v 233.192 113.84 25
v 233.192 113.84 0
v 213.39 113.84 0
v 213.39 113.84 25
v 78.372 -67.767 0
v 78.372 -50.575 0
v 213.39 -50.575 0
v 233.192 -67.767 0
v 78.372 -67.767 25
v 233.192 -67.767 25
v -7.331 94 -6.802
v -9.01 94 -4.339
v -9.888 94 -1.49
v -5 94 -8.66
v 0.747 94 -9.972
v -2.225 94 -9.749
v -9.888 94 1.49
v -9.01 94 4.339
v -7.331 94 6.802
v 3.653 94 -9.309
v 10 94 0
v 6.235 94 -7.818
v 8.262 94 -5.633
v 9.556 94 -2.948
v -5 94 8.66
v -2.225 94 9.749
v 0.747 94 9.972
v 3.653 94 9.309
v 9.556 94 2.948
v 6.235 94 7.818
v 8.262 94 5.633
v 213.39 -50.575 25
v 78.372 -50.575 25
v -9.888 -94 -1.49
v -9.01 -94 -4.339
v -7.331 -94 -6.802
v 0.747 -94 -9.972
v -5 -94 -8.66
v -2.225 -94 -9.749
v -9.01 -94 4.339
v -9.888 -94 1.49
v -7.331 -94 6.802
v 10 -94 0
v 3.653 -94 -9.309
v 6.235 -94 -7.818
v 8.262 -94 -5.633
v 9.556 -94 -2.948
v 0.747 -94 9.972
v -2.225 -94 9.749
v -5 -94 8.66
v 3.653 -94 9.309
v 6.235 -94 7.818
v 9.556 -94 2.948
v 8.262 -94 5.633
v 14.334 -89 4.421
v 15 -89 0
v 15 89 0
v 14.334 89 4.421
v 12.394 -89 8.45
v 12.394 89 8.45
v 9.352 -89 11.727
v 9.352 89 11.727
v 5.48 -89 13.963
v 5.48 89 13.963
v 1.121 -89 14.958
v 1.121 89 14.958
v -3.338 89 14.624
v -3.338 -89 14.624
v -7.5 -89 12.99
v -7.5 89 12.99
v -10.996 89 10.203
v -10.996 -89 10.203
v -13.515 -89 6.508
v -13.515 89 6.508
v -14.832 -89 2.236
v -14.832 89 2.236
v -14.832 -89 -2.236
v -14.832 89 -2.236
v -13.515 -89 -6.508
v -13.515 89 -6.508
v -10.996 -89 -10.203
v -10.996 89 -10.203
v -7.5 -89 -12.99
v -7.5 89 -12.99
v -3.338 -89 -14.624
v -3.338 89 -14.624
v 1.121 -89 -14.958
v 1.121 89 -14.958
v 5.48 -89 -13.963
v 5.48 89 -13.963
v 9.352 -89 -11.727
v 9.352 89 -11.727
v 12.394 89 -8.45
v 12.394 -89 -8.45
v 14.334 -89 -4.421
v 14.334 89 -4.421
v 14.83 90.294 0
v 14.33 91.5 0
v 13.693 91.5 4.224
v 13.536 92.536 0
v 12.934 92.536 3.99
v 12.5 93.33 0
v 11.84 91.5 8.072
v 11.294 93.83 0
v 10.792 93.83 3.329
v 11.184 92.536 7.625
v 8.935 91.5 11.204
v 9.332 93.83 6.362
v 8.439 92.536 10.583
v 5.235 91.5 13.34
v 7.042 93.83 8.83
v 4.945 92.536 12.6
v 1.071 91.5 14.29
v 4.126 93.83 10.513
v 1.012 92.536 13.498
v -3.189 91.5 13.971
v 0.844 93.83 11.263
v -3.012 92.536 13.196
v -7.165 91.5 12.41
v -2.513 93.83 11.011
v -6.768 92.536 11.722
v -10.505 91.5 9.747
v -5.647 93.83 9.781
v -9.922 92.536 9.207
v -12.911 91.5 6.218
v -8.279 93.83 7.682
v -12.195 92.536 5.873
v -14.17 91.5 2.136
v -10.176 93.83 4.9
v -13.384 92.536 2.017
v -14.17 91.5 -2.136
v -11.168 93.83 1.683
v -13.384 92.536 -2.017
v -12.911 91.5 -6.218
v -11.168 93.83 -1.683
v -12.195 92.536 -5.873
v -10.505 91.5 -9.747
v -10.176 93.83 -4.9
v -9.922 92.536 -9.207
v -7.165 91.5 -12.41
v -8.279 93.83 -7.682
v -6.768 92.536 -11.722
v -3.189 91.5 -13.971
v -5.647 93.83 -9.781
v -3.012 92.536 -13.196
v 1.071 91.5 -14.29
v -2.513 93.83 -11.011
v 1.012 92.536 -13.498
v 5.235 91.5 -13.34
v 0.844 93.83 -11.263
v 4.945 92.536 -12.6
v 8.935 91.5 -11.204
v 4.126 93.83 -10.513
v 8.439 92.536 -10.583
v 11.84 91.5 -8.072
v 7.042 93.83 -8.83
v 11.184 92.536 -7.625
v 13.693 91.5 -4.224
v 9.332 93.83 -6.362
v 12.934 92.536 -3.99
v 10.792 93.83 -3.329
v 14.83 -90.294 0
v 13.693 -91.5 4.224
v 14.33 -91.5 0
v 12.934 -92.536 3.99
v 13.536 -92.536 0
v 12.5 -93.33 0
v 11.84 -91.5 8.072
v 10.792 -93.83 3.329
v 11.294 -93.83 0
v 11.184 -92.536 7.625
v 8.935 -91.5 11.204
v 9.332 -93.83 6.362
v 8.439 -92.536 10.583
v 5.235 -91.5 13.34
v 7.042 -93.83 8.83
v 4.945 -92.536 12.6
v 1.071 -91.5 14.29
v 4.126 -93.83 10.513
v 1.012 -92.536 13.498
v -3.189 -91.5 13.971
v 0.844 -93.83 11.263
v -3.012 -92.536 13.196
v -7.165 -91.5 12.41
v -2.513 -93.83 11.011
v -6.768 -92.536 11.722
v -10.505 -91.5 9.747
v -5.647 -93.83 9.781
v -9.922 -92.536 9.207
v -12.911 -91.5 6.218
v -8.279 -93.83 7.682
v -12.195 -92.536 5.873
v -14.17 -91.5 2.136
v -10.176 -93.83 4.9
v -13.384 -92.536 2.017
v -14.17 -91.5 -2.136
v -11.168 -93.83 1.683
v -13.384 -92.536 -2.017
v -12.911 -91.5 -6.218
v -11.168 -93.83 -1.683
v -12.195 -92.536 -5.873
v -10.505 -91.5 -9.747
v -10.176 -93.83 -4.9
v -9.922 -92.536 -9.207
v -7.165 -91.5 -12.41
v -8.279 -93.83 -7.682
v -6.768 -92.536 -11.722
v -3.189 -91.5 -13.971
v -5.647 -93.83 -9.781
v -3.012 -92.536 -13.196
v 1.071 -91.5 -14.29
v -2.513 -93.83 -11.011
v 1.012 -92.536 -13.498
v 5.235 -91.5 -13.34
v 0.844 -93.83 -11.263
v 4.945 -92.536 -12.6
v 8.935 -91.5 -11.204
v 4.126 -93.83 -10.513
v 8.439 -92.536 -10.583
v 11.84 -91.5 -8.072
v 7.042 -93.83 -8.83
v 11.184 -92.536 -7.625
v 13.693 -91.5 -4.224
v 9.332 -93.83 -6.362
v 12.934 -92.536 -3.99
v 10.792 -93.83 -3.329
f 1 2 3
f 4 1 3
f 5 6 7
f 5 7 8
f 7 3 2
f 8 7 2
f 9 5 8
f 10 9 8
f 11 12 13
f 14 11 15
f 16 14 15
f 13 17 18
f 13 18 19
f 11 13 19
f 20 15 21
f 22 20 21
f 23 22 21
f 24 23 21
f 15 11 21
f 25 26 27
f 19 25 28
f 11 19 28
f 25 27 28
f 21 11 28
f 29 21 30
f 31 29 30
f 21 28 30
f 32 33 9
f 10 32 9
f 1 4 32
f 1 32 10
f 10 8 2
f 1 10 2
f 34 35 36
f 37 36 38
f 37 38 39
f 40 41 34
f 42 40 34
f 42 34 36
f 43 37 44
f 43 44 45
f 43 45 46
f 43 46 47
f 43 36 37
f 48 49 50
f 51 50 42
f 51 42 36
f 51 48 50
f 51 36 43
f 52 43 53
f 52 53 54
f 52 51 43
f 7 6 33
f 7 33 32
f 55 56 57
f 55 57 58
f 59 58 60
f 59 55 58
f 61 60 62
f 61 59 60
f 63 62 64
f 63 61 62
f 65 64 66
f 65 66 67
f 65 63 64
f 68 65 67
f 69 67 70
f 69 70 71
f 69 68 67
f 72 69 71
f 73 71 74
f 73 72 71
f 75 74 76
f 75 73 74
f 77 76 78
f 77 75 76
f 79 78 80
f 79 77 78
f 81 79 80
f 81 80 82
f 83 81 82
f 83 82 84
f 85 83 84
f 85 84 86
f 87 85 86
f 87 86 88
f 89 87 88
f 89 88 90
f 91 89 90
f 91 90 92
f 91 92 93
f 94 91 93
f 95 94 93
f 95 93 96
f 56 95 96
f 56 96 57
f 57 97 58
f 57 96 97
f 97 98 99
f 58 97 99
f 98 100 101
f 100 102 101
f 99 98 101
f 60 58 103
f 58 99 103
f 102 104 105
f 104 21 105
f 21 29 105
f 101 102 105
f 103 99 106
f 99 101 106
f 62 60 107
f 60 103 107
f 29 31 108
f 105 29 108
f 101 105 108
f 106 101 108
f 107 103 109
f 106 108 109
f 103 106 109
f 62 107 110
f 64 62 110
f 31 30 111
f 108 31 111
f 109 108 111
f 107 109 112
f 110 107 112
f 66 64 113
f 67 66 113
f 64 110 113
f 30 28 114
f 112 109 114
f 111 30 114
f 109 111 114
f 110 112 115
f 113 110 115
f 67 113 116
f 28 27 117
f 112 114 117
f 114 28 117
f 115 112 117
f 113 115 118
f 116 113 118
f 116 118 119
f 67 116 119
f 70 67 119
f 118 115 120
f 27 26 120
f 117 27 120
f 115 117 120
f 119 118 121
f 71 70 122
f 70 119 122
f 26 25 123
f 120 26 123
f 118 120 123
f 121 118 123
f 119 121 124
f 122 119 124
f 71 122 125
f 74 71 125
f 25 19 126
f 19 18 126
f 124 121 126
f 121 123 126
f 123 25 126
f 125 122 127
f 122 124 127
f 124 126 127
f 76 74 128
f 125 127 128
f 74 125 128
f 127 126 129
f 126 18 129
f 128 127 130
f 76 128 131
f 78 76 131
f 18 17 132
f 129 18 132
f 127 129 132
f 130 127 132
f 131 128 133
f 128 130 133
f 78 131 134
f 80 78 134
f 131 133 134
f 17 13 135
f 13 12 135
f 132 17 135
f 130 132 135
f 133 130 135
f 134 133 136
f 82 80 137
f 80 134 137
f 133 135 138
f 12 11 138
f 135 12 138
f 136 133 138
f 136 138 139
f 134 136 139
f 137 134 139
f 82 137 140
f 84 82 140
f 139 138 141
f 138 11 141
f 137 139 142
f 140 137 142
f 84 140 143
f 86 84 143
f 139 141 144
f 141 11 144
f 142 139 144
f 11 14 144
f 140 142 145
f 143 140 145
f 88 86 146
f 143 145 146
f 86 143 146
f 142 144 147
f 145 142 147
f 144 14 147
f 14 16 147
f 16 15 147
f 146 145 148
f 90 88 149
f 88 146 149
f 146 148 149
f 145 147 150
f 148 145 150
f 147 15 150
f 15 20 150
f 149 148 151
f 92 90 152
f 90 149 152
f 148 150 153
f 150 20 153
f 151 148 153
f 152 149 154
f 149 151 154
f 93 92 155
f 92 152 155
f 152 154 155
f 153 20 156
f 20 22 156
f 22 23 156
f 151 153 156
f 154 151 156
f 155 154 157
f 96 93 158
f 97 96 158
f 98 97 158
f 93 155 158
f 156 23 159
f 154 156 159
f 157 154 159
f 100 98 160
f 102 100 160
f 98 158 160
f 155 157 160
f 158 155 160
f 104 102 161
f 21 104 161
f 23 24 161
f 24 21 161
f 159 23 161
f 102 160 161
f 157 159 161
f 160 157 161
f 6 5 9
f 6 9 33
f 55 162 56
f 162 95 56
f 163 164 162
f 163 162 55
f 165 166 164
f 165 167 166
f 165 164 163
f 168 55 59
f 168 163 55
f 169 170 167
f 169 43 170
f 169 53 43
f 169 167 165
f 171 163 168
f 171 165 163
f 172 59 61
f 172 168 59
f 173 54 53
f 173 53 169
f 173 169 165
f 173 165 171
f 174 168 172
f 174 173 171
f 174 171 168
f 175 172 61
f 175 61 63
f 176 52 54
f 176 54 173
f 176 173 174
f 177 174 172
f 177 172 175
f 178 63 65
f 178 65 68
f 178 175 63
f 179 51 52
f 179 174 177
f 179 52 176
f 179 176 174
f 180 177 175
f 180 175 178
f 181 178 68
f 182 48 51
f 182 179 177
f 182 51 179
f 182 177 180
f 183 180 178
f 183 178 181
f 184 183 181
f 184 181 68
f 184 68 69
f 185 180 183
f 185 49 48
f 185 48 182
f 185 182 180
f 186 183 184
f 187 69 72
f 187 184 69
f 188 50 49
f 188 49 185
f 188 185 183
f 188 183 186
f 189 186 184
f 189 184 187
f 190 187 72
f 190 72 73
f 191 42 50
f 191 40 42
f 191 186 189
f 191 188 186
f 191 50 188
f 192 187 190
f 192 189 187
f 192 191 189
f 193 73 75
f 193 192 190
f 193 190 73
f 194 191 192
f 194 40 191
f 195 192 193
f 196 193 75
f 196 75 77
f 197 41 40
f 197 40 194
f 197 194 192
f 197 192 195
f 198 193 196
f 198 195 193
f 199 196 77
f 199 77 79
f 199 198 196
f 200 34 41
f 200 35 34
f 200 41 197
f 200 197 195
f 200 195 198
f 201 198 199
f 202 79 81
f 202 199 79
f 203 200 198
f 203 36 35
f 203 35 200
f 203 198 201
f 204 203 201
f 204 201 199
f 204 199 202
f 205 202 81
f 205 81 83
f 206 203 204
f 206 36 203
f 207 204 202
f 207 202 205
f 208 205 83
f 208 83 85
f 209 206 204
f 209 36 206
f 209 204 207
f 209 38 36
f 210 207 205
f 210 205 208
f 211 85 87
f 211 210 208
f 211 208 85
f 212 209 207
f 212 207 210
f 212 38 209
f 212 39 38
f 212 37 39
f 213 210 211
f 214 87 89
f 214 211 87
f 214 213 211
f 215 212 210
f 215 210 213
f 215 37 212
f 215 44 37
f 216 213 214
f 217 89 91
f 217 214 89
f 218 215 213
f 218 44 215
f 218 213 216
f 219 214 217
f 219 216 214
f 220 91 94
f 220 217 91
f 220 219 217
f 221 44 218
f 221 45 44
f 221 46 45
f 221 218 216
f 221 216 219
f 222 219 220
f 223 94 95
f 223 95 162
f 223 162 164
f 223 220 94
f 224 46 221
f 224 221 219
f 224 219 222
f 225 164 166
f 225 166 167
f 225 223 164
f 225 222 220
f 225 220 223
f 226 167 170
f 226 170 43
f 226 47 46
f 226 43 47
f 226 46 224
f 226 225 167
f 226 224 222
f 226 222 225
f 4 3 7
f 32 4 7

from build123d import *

# Parameters (mm, degrees)
F0_R     = 15
F1_DEPTH = 94
F2_R     = 5
F3_W     = 135.017038
F3_H     = 17.192084
F4_DEPTH = 25


with BuildPart() as f1:
    # F0 (on Front) → F1 (new body, symmetric)
    with BuildSketch(Plane.XZ):
        Circle(F0_R)
    extrude(amount=F1_DEPTH, both=True)

    # F2
    f2_edges = [f1.edges().sort_by_distance(p)[0] for p in [
        (-15, -94, 0),
        (-15, 94, 0),
    ]]
    fillet(f2_edges, radius=F2_R)


with BuildPart() as f4:
    # F3 (on Top) → F4 (new body)
    with BuildSketch(Plane.XY):
        Polygon((233.19228, 113.840185), (213.389531, 113.840185), (213.389531, -50.575171), (213.389531, -67.767255), (233.19228, -67.767255), align=None)
        with Locations((145.881012, -59.171213)):
            Rectangle(F3_W, F3_H)
    extrude(amount=F4_DEPTH)


solid = Compound([f1.part, f4.part])
